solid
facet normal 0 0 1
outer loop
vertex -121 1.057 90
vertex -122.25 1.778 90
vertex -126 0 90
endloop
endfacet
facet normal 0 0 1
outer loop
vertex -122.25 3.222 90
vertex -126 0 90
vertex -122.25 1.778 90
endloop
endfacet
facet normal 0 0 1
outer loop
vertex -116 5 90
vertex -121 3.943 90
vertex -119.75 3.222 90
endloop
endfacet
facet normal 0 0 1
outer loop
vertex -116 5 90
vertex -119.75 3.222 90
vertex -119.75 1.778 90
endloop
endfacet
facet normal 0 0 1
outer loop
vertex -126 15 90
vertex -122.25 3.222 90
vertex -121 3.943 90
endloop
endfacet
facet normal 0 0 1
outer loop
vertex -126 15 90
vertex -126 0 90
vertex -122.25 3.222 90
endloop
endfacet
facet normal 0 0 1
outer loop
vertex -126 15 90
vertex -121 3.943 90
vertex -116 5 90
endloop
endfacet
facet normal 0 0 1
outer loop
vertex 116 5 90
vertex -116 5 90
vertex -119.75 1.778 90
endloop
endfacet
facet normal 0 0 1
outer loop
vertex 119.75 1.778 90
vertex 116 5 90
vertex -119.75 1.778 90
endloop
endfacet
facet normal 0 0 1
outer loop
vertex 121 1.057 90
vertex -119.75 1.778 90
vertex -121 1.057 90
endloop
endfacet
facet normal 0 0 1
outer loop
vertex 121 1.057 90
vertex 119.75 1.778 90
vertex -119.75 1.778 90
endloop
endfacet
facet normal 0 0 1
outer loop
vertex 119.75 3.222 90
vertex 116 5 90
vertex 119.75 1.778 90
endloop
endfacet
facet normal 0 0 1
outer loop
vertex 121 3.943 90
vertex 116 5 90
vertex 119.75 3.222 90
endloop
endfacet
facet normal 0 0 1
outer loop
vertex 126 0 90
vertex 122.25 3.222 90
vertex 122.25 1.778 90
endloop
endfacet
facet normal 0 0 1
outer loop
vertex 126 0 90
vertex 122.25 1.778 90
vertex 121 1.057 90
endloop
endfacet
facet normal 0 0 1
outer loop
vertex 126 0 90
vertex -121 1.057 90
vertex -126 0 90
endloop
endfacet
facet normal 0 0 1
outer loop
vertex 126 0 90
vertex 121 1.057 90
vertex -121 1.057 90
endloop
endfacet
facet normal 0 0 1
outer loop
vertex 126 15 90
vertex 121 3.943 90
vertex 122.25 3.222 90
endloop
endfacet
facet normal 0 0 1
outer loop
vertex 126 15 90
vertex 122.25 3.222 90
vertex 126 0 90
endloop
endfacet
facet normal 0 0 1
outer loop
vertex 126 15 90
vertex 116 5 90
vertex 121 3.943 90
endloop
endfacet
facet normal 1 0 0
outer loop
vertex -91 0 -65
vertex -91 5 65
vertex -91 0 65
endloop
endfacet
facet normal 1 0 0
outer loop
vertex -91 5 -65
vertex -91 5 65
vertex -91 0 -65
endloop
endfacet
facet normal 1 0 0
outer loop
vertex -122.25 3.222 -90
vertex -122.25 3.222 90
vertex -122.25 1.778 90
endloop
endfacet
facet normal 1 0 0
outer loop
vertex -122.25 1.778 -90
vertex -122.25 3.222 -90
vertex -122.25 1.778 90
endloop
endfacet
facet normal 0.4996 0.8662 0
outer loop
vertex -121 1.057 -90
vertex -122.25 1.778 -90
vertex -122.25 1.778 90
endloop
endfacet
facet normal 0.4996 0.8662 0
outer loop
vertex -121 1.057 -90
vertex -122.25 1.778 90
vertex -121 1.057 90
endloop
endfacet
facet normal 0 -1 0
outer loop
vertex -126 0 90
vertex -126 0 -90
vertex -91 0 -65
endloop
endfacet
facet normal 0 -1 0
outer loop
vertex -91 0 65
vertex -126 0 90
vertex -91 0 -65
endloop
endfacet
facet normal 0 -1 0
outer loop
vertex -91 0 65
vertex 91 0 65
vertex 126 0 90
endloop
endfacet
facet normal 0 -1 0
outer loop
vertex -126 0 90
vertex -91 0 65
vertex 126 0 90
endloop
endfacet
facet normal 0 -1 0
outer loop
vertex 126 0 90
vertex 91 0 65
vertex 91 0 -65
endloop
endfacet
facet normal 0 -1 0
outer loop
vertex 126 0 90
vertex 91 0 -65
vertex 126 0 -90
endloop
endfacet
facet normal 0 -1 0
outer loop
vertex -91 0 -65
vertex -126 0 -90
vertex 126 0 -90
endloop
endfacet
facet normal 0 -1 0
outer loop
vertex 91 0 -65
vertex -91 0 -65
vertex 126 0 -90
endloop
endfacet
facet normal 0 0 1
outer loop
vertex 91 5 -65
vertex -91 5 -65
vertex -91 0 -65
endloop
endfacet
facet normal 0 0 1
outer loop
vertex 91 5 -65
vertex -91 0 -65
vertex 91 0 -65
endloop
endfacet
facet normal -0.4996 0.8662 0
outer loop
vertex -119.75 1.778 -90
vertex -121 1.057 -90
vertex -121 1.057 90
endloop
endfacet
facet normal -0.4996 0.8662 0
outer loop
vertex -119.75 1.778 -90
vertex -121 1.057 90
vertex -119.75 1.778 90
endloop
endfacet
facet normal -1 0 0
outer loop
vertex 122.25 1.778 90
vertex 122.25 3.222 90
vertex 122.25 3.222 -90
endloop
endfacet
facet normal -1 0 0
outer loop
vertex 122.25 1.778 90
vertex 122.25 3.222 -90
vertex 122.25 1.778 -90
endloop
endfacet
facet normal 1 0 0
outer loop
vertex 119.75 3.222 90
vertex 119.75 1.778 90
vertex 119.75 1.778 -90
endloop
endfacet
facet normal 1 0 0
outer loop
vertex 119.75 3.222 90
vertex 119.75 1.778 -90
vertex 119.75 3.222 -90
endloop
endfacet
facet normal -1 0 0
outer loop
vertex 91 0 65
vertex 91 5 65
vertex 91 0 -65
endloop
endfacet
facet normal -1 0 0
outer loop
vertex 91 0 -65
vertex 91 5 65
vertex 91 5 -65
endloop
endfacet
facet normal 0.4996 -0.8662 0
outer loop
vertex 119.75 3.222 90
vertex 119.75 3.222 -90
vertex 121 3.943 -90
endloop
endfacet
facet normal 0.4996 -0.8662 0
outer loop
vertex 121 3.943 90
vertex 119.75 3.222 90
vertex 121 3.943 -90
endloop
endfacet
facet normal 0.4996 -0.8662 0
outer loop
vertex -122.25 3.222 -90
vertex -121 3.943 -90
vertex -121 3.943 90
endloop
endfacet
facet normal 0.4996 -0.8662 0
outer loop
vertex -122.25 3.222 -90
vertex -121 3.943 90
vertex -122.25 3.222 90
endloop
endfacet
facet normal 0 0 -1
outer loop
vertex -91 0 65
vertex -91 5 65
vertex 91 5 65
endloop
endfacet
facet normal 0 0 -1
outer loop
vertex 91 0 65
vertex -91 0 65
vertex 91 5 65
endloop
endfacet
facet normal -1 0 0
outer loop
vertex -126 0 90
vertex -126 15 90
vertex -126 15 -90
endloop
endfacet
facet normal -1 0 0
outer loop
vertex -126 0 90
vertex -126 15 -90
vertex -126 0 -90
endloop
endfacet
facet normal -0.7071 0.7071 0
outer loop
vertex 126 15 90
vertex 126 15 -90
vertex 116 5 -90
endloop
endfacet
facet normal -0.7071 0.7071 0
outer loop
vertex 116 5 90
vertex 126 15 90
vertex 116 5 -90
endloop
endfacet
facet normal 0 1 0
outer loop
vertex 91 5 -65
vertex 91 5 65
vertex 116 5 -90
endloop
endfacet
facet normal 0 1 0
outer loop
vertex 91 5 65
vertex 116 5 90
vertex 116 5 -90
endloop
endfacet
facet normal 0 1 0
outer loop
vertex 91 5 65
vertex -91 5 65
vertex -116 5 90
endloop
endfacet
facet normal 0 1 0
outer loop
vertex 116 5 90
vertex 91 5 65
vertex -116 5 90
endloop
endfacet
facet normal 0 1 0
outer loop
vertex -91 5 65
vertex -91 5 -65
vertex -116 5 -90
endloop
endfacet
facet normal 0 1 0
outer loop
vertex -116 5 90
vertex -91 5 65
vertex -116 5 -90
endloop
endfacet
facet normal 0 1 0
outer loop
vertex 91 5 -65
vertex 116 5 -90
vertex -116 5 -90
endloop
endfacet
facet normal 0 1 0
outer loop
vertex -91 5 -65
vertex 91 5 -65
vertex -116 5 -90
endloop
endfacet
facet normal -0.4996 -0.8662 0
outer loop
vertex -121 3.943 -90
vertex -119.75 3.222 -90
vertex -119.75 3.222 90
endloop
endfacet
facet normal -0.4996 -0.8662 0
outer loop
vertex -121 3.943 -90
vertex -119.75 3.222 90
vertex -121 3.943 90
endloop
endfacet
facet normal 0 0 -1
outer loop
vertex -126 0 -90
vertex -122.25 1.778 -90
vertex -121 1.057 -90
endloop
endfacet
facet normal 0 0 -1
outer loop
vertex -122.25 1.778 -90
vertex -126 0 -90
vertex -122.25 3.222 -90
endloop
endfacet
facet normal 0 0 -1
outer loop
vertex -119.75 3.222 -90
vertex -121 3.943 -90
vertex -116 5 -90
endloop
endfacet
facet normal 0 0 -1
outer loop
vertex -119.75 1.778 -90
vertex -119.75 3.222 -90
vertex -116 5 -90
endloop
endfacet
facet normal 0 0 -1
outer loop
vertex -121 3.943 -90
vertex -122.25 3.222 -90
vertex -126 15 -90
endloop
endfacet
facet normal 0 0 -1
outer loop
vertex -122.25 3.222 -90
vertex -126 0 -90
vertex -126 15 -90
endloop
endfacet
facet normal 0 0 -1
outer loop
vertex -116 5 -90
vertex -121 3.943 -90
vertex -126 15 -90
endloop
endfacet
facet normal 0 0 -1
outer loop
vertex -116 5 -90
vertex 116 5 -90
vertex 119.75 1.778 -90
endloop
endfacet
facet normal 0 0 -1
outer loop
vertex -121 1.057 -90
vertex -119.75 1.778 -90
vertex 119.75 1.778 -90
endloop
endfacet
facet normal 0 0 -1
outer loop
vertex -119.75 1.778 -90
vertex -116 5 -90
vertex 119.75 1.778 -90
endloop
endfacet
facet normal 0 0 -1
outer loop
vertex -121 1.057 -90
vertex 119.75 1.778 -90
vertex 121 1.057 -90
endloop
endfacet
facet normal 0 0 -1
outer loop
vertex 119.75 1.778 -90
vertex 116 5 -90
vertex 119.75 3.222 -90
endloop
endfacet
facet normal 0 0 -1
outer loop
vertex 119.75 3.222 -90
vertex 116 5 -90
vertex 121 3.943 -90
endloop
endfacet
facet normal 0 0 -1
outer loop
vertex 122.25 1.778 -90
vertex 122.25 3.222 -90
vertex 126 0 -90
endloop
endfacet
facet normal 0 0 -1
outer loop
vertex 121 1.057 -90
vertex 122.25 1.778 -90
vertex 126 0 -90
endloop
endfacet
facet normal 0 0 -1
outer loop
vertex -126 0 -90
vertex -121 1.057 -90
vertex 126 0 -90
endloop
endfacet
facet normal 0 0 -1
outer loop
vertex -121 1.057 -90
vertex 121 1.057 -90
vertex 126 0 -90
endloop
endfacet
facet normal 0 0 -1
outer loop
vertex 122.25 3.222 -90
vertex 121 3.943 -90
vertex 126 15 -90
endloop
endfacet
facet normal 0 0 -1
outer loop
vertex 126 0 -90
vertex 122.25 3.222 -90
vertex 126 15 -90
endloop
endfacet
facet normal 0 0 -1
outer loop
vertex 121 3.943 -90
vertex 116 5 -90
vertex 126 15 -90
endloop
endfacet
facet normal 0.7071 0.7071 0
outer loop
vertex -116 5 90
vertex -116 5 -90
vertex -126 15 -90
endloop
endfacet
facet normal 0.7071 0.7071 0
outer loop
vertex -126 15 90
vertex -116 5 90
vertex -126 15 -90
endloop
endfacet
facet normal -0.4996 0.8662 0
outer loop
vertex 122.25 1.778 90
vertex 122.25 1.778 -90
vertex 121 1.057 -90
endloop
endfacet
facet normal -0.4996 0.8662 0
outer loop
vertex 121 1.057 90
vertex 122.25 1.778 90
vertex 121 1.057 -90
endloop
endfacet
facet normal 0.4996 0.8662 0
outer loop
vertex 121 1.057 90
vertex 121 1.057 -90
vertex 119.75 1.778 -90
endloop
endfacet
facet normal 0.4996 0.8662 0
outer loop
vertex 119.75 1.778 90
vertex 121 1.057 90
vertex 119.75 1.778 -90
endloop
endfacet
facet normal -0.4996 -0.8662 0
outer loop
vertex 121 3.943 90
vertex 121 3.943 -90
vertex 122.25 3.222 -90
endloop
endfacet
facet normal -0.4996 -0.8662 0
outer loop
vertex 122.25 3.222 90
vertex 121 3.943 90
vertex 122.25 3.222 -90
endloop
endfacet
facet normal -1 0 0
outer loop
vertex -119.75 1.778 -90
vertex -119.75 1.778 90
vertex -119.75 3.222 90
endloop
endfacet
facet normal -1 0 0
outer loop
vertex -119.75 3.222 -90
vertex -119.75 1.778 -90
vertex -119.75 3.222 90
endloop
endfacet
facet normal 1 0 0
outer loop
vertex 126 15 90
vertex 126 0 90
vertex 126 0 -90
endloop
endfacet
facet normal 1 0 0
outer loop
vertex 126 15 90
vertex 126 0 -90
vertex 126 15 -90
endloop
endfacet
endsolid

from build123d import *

# Parameters (mm, degrees)
BOSS_EXTRUDE1_DEPTH      = 90
BOSS_EXTRUDE1_DEPTH_BACK = 90
CUT_EXTRUDE1_DEPTH       = 221.229425827
SKETCH5_W                = 182
SKETCH5_H                = 130
CUT_EXTRUDE3_DEPTH       = 156.164428913


with BuildPart() as part:
    # Sketch1 → Boss-Extrude1 (new, two sides: drawn at the far end of the back side and taken through both)
    with BuildSketch(Plane.XY.offset(-BOSS_EXTRUDE1_DEPTH_BACK)):
        Polygon((-126, 0), (126, 0), (126, 15), (116, 5), (-116, 5), (-126, 15), align=None)
    extrude(amount=BOSS_EXTRUDE1_DEPTH + BOSS_EXTRUDE1_DEPTH_BACK)

    # Sketch3 → Cut-Extrude1 (cut, through all)
    with BuildSketch(Plane.XY.offset(90)):
        Polygon((-121, 3.943375673), (-122.25, 3.221687836), (-122.25, 1.778312164), (-121, 1.056624327), (-119.75, 1.778312164), (-119.75, 3.221687836), align=None)
        Polygon((119.75, 3.221687836), (121, 3.943375673), (122.25, 3.221687836), (122.25, 1.778312164), (121, 1.056624327), (119.75, 1.778312164), align=None)
    extrude(amount=-CUT_EXTRUDE1_DEPTH, mode=Mode.SUBTRACT)

    # Sketch5 → Cut-Extrude3 (cut, through all)
    with BuildSketch(Plane(origin=(0, 5, 0), x_dir=(1, 0, 0), z_dir=(0, 1, 0))):
        Rectangle(SKETCH5_W, SKETCH5_H)
    extrude(amount=-CUT_EXTRUDE3_DEPTH, mode=Mode.SUBTRACT)


solid = part.part
